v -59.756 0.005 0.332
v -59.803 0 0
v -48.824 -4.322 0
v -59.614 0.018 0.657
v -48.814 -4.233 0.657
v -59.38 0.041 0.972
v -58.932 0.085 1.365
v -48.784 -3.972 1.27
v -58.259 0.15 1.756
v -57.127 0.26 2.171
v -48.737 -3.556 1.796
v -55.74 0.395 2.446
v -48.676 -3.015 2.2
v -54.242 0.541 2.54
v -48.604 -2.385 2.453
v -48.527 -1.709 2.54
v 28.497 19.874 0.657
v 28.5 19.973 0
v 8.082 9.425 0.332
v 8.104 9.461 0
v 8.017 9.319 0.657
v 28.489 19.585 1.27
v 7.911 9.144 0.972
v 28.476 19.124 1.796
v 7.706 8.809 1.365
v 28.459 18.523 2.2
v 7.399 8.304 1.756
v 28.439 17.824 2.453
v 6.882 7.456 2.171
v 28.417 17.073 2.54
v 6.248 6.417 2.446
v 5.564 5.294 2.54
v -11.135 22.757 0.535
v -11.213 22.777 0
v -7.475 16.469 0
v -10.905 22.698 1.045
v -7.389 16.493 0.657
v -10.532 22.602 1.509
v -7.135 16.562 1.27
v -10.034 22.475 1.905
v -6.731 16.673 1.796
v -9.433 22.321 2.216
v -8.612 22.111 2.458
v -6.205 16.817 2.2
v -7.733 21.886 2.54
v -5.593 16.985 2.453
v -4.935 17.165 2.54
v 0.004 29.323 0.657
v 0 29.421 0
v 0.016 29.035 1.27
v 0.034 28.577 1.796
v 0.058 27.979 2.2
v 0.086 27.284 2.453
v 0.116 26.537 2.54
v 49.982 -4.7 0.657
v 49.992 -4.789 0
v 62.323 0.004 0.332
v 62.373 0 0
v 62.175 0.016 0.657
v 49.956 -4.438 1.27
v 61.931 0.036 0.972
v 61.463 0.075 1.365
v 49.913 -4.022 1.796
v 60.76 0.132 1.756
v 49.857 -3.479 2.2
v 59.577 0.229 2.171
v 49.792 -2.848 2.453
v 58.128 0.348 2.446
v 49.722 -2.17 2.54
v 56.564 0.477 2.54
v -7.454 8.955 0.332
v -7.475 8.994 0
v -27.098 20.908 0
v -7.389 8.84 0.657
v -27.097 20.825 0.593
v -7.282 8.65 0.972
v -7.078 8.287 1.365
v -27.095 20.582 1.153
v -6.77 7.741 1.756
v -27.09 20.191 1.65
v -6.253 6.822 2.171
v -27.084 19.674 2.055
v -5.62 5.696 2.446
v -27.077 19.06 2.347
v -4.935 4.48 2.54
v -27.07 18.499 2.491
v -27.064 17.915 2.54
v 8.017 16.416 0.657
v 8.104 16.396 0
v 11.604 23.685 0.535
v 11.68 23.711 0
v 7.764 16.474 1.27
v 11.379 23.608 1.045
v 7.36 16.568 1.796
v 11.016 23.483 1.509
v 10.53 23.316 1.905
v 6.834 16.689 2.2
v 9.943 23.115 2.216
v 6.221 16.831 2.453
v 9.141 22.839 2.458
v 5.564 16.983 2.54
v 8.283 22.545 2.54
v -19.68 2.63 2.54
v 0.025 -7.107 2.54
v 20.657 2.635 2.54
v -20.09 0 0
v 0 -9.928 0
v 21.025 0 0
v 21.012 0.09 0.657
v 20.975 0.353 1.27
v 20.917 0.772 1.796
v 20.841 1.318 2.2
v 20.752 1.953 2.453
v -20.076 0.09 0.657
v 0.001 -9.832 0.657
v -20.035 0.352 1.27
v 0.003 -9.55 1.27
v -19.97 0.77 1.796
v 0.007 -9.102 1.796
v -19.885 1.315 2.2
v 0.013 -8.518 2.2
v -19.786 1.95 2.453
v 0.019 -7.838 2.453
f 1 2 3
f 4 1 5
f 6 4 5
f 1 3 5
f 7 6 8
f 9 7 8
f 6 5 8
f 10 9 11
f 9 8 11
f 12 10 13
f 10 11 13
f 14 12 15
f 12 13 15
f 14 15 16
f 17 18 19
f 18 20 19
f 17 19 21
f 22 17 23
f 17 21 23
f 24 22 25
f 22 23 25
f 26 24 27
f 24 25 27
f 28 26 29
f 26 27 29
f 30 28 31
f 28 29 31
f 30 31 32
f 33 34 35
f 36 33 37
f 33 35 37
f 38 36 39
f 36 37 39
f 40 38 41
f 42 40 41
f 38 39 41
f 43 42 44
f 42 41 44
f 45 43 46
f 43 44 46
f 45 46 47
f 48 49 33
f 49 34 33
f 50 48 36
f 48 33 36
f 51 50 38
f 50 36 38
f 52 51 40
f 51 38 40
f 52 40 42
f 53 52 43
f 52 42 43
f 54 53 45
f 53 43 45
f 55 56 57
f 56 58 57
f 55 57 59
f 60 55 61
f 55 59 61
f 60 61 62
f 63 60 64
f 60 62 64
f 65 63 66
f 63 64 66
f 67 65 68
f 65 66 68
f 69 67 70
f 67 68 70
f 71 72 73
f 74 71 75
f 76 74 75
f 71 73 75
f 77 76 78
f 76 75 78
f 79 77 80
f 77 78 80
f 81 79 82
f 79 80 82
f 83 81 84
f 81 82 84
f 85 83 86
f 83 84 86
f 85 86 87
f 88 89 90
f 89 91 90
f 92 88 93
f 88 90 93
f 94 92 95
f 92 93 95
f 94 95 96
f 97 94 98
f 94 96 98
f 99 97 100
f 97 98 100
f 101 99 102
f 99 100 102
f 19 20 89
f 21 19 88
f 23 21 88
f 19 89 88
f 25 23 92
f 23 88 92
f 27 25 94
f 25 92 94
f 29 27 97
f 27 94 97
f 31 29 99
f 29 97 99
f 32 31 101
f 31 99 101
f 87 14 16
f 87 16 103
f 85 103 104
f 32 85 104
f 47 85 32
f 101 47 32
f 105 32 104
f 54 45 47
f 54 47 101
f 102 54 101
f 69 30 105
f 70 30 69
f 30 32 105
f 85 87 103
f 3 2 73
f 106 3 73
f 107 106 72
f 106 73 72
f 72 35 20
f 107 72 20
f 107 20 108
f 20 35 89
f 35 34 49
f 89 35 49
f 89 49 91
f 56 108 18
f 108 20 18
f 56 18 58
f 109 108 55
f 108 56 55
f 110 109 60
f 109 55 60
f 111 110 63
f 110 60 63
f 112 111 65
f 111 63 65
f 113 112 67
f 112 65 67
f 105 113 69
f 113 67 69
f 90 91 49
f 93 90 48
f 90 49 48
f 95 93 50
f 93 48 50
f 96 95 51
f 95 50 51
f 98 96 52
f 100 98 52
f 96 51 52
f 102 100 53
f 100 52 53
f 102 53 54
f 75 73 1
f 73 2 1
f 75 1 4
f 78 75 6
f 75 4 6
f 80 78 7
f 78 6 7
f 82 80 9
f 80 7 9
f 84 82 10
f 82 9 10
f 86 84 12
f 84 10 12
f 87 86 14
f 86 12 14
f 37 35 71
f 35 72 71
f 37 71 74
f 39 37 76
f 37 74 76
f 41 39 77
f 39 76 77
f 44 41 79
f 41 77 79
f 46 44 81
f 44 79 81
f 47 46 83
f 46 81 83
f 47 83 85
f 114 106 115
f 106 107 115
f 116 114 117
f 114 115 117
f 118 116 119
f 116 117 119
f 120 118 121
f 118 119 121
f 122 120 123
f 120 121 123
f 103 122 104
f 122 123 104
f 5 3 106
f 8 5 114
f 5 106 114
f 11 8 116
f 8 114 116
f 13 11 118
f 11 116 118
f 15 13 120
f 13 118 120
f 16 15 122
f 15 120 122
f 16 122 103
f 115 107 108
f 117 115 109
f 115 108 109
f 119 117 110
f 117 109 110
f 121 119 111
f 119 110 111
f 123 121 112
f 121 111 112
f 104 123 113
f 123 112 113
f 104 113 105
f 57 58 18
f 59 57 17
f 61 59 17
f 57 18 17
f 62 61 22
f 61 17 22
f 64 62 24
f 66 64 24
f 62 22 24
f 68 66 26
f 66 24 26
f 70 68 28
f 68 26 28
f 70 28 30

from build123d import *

# Parameters (mm, degrees)
F1_DEPTH = 2.54
F2_R     = 2.53999


# Not quite as in the source:
# - a fillet or chamfer is up to 0.001 mm smaller than in the source, because OpenCascade refuses the exact size


with BuildPart() as f1:
    # F0 (on Top) → F1 (new body)
    with BuildSketch(Plane.XY):
        Polygon((-27.0982775837, 20.9077224135), (-59.8030947149, 0), (-48.823621124, -4.3217078783), (-20.0901012868, 0), (0, -9.9282488227), (21.0245233029, 0), (49.9916523695, -4.7889198177), (62.3727589846, 0), (28.4999143332, 19.9733003974), (8.1038610589, 9.461035952), (8.1038610589, 16.395563461), (11.6802928969, 23.7109921873), (0, 29.4213576296), (-11.2130800262, 22.7765701711), (-7.4753868394, 16.4692122489), (-7.4753868394, 8.9938249439), align=None)
    extrude(amount=F1_DEPTH)

    # F2 (radius 2.54 in the source; OpenCascade refuses exactly that, so slightly less here)
    f2_edges = [f1.edges().sort_by_distance(p)[0] for p in [
        (-43.450686, 10.453861, 2.54),
        (-17.286832, 14.950774, 2.54),
        (-7.475387, 12.731519, 2.54),
        (-9.344233, 19.622891, 2.54),
        (-5.60654, 26.098964, 2.54),
        (5.840146, 26.566175, 2.54),
        (9.892077, 20.053278, 2.54),
        (8.103861, 12.9283, 2.54),
        (18.301888, 14.717168, 2.54),
        (45.436337, 9.98665, 2.54),
        (-54.313358, -2.160854, 2.54),
        (-34.456861, -2.160854, 2.54),
        (-10.045051, -4.964124, 2.54),
        (10.512262, -4.964124, 2.54),
        (35.508088, -2.39446, 2.54),
        (56.182206, -2.39446, 2.54),
    ]]
    fillet(f2_edges, radius=F2_R)


solid = f1.part
